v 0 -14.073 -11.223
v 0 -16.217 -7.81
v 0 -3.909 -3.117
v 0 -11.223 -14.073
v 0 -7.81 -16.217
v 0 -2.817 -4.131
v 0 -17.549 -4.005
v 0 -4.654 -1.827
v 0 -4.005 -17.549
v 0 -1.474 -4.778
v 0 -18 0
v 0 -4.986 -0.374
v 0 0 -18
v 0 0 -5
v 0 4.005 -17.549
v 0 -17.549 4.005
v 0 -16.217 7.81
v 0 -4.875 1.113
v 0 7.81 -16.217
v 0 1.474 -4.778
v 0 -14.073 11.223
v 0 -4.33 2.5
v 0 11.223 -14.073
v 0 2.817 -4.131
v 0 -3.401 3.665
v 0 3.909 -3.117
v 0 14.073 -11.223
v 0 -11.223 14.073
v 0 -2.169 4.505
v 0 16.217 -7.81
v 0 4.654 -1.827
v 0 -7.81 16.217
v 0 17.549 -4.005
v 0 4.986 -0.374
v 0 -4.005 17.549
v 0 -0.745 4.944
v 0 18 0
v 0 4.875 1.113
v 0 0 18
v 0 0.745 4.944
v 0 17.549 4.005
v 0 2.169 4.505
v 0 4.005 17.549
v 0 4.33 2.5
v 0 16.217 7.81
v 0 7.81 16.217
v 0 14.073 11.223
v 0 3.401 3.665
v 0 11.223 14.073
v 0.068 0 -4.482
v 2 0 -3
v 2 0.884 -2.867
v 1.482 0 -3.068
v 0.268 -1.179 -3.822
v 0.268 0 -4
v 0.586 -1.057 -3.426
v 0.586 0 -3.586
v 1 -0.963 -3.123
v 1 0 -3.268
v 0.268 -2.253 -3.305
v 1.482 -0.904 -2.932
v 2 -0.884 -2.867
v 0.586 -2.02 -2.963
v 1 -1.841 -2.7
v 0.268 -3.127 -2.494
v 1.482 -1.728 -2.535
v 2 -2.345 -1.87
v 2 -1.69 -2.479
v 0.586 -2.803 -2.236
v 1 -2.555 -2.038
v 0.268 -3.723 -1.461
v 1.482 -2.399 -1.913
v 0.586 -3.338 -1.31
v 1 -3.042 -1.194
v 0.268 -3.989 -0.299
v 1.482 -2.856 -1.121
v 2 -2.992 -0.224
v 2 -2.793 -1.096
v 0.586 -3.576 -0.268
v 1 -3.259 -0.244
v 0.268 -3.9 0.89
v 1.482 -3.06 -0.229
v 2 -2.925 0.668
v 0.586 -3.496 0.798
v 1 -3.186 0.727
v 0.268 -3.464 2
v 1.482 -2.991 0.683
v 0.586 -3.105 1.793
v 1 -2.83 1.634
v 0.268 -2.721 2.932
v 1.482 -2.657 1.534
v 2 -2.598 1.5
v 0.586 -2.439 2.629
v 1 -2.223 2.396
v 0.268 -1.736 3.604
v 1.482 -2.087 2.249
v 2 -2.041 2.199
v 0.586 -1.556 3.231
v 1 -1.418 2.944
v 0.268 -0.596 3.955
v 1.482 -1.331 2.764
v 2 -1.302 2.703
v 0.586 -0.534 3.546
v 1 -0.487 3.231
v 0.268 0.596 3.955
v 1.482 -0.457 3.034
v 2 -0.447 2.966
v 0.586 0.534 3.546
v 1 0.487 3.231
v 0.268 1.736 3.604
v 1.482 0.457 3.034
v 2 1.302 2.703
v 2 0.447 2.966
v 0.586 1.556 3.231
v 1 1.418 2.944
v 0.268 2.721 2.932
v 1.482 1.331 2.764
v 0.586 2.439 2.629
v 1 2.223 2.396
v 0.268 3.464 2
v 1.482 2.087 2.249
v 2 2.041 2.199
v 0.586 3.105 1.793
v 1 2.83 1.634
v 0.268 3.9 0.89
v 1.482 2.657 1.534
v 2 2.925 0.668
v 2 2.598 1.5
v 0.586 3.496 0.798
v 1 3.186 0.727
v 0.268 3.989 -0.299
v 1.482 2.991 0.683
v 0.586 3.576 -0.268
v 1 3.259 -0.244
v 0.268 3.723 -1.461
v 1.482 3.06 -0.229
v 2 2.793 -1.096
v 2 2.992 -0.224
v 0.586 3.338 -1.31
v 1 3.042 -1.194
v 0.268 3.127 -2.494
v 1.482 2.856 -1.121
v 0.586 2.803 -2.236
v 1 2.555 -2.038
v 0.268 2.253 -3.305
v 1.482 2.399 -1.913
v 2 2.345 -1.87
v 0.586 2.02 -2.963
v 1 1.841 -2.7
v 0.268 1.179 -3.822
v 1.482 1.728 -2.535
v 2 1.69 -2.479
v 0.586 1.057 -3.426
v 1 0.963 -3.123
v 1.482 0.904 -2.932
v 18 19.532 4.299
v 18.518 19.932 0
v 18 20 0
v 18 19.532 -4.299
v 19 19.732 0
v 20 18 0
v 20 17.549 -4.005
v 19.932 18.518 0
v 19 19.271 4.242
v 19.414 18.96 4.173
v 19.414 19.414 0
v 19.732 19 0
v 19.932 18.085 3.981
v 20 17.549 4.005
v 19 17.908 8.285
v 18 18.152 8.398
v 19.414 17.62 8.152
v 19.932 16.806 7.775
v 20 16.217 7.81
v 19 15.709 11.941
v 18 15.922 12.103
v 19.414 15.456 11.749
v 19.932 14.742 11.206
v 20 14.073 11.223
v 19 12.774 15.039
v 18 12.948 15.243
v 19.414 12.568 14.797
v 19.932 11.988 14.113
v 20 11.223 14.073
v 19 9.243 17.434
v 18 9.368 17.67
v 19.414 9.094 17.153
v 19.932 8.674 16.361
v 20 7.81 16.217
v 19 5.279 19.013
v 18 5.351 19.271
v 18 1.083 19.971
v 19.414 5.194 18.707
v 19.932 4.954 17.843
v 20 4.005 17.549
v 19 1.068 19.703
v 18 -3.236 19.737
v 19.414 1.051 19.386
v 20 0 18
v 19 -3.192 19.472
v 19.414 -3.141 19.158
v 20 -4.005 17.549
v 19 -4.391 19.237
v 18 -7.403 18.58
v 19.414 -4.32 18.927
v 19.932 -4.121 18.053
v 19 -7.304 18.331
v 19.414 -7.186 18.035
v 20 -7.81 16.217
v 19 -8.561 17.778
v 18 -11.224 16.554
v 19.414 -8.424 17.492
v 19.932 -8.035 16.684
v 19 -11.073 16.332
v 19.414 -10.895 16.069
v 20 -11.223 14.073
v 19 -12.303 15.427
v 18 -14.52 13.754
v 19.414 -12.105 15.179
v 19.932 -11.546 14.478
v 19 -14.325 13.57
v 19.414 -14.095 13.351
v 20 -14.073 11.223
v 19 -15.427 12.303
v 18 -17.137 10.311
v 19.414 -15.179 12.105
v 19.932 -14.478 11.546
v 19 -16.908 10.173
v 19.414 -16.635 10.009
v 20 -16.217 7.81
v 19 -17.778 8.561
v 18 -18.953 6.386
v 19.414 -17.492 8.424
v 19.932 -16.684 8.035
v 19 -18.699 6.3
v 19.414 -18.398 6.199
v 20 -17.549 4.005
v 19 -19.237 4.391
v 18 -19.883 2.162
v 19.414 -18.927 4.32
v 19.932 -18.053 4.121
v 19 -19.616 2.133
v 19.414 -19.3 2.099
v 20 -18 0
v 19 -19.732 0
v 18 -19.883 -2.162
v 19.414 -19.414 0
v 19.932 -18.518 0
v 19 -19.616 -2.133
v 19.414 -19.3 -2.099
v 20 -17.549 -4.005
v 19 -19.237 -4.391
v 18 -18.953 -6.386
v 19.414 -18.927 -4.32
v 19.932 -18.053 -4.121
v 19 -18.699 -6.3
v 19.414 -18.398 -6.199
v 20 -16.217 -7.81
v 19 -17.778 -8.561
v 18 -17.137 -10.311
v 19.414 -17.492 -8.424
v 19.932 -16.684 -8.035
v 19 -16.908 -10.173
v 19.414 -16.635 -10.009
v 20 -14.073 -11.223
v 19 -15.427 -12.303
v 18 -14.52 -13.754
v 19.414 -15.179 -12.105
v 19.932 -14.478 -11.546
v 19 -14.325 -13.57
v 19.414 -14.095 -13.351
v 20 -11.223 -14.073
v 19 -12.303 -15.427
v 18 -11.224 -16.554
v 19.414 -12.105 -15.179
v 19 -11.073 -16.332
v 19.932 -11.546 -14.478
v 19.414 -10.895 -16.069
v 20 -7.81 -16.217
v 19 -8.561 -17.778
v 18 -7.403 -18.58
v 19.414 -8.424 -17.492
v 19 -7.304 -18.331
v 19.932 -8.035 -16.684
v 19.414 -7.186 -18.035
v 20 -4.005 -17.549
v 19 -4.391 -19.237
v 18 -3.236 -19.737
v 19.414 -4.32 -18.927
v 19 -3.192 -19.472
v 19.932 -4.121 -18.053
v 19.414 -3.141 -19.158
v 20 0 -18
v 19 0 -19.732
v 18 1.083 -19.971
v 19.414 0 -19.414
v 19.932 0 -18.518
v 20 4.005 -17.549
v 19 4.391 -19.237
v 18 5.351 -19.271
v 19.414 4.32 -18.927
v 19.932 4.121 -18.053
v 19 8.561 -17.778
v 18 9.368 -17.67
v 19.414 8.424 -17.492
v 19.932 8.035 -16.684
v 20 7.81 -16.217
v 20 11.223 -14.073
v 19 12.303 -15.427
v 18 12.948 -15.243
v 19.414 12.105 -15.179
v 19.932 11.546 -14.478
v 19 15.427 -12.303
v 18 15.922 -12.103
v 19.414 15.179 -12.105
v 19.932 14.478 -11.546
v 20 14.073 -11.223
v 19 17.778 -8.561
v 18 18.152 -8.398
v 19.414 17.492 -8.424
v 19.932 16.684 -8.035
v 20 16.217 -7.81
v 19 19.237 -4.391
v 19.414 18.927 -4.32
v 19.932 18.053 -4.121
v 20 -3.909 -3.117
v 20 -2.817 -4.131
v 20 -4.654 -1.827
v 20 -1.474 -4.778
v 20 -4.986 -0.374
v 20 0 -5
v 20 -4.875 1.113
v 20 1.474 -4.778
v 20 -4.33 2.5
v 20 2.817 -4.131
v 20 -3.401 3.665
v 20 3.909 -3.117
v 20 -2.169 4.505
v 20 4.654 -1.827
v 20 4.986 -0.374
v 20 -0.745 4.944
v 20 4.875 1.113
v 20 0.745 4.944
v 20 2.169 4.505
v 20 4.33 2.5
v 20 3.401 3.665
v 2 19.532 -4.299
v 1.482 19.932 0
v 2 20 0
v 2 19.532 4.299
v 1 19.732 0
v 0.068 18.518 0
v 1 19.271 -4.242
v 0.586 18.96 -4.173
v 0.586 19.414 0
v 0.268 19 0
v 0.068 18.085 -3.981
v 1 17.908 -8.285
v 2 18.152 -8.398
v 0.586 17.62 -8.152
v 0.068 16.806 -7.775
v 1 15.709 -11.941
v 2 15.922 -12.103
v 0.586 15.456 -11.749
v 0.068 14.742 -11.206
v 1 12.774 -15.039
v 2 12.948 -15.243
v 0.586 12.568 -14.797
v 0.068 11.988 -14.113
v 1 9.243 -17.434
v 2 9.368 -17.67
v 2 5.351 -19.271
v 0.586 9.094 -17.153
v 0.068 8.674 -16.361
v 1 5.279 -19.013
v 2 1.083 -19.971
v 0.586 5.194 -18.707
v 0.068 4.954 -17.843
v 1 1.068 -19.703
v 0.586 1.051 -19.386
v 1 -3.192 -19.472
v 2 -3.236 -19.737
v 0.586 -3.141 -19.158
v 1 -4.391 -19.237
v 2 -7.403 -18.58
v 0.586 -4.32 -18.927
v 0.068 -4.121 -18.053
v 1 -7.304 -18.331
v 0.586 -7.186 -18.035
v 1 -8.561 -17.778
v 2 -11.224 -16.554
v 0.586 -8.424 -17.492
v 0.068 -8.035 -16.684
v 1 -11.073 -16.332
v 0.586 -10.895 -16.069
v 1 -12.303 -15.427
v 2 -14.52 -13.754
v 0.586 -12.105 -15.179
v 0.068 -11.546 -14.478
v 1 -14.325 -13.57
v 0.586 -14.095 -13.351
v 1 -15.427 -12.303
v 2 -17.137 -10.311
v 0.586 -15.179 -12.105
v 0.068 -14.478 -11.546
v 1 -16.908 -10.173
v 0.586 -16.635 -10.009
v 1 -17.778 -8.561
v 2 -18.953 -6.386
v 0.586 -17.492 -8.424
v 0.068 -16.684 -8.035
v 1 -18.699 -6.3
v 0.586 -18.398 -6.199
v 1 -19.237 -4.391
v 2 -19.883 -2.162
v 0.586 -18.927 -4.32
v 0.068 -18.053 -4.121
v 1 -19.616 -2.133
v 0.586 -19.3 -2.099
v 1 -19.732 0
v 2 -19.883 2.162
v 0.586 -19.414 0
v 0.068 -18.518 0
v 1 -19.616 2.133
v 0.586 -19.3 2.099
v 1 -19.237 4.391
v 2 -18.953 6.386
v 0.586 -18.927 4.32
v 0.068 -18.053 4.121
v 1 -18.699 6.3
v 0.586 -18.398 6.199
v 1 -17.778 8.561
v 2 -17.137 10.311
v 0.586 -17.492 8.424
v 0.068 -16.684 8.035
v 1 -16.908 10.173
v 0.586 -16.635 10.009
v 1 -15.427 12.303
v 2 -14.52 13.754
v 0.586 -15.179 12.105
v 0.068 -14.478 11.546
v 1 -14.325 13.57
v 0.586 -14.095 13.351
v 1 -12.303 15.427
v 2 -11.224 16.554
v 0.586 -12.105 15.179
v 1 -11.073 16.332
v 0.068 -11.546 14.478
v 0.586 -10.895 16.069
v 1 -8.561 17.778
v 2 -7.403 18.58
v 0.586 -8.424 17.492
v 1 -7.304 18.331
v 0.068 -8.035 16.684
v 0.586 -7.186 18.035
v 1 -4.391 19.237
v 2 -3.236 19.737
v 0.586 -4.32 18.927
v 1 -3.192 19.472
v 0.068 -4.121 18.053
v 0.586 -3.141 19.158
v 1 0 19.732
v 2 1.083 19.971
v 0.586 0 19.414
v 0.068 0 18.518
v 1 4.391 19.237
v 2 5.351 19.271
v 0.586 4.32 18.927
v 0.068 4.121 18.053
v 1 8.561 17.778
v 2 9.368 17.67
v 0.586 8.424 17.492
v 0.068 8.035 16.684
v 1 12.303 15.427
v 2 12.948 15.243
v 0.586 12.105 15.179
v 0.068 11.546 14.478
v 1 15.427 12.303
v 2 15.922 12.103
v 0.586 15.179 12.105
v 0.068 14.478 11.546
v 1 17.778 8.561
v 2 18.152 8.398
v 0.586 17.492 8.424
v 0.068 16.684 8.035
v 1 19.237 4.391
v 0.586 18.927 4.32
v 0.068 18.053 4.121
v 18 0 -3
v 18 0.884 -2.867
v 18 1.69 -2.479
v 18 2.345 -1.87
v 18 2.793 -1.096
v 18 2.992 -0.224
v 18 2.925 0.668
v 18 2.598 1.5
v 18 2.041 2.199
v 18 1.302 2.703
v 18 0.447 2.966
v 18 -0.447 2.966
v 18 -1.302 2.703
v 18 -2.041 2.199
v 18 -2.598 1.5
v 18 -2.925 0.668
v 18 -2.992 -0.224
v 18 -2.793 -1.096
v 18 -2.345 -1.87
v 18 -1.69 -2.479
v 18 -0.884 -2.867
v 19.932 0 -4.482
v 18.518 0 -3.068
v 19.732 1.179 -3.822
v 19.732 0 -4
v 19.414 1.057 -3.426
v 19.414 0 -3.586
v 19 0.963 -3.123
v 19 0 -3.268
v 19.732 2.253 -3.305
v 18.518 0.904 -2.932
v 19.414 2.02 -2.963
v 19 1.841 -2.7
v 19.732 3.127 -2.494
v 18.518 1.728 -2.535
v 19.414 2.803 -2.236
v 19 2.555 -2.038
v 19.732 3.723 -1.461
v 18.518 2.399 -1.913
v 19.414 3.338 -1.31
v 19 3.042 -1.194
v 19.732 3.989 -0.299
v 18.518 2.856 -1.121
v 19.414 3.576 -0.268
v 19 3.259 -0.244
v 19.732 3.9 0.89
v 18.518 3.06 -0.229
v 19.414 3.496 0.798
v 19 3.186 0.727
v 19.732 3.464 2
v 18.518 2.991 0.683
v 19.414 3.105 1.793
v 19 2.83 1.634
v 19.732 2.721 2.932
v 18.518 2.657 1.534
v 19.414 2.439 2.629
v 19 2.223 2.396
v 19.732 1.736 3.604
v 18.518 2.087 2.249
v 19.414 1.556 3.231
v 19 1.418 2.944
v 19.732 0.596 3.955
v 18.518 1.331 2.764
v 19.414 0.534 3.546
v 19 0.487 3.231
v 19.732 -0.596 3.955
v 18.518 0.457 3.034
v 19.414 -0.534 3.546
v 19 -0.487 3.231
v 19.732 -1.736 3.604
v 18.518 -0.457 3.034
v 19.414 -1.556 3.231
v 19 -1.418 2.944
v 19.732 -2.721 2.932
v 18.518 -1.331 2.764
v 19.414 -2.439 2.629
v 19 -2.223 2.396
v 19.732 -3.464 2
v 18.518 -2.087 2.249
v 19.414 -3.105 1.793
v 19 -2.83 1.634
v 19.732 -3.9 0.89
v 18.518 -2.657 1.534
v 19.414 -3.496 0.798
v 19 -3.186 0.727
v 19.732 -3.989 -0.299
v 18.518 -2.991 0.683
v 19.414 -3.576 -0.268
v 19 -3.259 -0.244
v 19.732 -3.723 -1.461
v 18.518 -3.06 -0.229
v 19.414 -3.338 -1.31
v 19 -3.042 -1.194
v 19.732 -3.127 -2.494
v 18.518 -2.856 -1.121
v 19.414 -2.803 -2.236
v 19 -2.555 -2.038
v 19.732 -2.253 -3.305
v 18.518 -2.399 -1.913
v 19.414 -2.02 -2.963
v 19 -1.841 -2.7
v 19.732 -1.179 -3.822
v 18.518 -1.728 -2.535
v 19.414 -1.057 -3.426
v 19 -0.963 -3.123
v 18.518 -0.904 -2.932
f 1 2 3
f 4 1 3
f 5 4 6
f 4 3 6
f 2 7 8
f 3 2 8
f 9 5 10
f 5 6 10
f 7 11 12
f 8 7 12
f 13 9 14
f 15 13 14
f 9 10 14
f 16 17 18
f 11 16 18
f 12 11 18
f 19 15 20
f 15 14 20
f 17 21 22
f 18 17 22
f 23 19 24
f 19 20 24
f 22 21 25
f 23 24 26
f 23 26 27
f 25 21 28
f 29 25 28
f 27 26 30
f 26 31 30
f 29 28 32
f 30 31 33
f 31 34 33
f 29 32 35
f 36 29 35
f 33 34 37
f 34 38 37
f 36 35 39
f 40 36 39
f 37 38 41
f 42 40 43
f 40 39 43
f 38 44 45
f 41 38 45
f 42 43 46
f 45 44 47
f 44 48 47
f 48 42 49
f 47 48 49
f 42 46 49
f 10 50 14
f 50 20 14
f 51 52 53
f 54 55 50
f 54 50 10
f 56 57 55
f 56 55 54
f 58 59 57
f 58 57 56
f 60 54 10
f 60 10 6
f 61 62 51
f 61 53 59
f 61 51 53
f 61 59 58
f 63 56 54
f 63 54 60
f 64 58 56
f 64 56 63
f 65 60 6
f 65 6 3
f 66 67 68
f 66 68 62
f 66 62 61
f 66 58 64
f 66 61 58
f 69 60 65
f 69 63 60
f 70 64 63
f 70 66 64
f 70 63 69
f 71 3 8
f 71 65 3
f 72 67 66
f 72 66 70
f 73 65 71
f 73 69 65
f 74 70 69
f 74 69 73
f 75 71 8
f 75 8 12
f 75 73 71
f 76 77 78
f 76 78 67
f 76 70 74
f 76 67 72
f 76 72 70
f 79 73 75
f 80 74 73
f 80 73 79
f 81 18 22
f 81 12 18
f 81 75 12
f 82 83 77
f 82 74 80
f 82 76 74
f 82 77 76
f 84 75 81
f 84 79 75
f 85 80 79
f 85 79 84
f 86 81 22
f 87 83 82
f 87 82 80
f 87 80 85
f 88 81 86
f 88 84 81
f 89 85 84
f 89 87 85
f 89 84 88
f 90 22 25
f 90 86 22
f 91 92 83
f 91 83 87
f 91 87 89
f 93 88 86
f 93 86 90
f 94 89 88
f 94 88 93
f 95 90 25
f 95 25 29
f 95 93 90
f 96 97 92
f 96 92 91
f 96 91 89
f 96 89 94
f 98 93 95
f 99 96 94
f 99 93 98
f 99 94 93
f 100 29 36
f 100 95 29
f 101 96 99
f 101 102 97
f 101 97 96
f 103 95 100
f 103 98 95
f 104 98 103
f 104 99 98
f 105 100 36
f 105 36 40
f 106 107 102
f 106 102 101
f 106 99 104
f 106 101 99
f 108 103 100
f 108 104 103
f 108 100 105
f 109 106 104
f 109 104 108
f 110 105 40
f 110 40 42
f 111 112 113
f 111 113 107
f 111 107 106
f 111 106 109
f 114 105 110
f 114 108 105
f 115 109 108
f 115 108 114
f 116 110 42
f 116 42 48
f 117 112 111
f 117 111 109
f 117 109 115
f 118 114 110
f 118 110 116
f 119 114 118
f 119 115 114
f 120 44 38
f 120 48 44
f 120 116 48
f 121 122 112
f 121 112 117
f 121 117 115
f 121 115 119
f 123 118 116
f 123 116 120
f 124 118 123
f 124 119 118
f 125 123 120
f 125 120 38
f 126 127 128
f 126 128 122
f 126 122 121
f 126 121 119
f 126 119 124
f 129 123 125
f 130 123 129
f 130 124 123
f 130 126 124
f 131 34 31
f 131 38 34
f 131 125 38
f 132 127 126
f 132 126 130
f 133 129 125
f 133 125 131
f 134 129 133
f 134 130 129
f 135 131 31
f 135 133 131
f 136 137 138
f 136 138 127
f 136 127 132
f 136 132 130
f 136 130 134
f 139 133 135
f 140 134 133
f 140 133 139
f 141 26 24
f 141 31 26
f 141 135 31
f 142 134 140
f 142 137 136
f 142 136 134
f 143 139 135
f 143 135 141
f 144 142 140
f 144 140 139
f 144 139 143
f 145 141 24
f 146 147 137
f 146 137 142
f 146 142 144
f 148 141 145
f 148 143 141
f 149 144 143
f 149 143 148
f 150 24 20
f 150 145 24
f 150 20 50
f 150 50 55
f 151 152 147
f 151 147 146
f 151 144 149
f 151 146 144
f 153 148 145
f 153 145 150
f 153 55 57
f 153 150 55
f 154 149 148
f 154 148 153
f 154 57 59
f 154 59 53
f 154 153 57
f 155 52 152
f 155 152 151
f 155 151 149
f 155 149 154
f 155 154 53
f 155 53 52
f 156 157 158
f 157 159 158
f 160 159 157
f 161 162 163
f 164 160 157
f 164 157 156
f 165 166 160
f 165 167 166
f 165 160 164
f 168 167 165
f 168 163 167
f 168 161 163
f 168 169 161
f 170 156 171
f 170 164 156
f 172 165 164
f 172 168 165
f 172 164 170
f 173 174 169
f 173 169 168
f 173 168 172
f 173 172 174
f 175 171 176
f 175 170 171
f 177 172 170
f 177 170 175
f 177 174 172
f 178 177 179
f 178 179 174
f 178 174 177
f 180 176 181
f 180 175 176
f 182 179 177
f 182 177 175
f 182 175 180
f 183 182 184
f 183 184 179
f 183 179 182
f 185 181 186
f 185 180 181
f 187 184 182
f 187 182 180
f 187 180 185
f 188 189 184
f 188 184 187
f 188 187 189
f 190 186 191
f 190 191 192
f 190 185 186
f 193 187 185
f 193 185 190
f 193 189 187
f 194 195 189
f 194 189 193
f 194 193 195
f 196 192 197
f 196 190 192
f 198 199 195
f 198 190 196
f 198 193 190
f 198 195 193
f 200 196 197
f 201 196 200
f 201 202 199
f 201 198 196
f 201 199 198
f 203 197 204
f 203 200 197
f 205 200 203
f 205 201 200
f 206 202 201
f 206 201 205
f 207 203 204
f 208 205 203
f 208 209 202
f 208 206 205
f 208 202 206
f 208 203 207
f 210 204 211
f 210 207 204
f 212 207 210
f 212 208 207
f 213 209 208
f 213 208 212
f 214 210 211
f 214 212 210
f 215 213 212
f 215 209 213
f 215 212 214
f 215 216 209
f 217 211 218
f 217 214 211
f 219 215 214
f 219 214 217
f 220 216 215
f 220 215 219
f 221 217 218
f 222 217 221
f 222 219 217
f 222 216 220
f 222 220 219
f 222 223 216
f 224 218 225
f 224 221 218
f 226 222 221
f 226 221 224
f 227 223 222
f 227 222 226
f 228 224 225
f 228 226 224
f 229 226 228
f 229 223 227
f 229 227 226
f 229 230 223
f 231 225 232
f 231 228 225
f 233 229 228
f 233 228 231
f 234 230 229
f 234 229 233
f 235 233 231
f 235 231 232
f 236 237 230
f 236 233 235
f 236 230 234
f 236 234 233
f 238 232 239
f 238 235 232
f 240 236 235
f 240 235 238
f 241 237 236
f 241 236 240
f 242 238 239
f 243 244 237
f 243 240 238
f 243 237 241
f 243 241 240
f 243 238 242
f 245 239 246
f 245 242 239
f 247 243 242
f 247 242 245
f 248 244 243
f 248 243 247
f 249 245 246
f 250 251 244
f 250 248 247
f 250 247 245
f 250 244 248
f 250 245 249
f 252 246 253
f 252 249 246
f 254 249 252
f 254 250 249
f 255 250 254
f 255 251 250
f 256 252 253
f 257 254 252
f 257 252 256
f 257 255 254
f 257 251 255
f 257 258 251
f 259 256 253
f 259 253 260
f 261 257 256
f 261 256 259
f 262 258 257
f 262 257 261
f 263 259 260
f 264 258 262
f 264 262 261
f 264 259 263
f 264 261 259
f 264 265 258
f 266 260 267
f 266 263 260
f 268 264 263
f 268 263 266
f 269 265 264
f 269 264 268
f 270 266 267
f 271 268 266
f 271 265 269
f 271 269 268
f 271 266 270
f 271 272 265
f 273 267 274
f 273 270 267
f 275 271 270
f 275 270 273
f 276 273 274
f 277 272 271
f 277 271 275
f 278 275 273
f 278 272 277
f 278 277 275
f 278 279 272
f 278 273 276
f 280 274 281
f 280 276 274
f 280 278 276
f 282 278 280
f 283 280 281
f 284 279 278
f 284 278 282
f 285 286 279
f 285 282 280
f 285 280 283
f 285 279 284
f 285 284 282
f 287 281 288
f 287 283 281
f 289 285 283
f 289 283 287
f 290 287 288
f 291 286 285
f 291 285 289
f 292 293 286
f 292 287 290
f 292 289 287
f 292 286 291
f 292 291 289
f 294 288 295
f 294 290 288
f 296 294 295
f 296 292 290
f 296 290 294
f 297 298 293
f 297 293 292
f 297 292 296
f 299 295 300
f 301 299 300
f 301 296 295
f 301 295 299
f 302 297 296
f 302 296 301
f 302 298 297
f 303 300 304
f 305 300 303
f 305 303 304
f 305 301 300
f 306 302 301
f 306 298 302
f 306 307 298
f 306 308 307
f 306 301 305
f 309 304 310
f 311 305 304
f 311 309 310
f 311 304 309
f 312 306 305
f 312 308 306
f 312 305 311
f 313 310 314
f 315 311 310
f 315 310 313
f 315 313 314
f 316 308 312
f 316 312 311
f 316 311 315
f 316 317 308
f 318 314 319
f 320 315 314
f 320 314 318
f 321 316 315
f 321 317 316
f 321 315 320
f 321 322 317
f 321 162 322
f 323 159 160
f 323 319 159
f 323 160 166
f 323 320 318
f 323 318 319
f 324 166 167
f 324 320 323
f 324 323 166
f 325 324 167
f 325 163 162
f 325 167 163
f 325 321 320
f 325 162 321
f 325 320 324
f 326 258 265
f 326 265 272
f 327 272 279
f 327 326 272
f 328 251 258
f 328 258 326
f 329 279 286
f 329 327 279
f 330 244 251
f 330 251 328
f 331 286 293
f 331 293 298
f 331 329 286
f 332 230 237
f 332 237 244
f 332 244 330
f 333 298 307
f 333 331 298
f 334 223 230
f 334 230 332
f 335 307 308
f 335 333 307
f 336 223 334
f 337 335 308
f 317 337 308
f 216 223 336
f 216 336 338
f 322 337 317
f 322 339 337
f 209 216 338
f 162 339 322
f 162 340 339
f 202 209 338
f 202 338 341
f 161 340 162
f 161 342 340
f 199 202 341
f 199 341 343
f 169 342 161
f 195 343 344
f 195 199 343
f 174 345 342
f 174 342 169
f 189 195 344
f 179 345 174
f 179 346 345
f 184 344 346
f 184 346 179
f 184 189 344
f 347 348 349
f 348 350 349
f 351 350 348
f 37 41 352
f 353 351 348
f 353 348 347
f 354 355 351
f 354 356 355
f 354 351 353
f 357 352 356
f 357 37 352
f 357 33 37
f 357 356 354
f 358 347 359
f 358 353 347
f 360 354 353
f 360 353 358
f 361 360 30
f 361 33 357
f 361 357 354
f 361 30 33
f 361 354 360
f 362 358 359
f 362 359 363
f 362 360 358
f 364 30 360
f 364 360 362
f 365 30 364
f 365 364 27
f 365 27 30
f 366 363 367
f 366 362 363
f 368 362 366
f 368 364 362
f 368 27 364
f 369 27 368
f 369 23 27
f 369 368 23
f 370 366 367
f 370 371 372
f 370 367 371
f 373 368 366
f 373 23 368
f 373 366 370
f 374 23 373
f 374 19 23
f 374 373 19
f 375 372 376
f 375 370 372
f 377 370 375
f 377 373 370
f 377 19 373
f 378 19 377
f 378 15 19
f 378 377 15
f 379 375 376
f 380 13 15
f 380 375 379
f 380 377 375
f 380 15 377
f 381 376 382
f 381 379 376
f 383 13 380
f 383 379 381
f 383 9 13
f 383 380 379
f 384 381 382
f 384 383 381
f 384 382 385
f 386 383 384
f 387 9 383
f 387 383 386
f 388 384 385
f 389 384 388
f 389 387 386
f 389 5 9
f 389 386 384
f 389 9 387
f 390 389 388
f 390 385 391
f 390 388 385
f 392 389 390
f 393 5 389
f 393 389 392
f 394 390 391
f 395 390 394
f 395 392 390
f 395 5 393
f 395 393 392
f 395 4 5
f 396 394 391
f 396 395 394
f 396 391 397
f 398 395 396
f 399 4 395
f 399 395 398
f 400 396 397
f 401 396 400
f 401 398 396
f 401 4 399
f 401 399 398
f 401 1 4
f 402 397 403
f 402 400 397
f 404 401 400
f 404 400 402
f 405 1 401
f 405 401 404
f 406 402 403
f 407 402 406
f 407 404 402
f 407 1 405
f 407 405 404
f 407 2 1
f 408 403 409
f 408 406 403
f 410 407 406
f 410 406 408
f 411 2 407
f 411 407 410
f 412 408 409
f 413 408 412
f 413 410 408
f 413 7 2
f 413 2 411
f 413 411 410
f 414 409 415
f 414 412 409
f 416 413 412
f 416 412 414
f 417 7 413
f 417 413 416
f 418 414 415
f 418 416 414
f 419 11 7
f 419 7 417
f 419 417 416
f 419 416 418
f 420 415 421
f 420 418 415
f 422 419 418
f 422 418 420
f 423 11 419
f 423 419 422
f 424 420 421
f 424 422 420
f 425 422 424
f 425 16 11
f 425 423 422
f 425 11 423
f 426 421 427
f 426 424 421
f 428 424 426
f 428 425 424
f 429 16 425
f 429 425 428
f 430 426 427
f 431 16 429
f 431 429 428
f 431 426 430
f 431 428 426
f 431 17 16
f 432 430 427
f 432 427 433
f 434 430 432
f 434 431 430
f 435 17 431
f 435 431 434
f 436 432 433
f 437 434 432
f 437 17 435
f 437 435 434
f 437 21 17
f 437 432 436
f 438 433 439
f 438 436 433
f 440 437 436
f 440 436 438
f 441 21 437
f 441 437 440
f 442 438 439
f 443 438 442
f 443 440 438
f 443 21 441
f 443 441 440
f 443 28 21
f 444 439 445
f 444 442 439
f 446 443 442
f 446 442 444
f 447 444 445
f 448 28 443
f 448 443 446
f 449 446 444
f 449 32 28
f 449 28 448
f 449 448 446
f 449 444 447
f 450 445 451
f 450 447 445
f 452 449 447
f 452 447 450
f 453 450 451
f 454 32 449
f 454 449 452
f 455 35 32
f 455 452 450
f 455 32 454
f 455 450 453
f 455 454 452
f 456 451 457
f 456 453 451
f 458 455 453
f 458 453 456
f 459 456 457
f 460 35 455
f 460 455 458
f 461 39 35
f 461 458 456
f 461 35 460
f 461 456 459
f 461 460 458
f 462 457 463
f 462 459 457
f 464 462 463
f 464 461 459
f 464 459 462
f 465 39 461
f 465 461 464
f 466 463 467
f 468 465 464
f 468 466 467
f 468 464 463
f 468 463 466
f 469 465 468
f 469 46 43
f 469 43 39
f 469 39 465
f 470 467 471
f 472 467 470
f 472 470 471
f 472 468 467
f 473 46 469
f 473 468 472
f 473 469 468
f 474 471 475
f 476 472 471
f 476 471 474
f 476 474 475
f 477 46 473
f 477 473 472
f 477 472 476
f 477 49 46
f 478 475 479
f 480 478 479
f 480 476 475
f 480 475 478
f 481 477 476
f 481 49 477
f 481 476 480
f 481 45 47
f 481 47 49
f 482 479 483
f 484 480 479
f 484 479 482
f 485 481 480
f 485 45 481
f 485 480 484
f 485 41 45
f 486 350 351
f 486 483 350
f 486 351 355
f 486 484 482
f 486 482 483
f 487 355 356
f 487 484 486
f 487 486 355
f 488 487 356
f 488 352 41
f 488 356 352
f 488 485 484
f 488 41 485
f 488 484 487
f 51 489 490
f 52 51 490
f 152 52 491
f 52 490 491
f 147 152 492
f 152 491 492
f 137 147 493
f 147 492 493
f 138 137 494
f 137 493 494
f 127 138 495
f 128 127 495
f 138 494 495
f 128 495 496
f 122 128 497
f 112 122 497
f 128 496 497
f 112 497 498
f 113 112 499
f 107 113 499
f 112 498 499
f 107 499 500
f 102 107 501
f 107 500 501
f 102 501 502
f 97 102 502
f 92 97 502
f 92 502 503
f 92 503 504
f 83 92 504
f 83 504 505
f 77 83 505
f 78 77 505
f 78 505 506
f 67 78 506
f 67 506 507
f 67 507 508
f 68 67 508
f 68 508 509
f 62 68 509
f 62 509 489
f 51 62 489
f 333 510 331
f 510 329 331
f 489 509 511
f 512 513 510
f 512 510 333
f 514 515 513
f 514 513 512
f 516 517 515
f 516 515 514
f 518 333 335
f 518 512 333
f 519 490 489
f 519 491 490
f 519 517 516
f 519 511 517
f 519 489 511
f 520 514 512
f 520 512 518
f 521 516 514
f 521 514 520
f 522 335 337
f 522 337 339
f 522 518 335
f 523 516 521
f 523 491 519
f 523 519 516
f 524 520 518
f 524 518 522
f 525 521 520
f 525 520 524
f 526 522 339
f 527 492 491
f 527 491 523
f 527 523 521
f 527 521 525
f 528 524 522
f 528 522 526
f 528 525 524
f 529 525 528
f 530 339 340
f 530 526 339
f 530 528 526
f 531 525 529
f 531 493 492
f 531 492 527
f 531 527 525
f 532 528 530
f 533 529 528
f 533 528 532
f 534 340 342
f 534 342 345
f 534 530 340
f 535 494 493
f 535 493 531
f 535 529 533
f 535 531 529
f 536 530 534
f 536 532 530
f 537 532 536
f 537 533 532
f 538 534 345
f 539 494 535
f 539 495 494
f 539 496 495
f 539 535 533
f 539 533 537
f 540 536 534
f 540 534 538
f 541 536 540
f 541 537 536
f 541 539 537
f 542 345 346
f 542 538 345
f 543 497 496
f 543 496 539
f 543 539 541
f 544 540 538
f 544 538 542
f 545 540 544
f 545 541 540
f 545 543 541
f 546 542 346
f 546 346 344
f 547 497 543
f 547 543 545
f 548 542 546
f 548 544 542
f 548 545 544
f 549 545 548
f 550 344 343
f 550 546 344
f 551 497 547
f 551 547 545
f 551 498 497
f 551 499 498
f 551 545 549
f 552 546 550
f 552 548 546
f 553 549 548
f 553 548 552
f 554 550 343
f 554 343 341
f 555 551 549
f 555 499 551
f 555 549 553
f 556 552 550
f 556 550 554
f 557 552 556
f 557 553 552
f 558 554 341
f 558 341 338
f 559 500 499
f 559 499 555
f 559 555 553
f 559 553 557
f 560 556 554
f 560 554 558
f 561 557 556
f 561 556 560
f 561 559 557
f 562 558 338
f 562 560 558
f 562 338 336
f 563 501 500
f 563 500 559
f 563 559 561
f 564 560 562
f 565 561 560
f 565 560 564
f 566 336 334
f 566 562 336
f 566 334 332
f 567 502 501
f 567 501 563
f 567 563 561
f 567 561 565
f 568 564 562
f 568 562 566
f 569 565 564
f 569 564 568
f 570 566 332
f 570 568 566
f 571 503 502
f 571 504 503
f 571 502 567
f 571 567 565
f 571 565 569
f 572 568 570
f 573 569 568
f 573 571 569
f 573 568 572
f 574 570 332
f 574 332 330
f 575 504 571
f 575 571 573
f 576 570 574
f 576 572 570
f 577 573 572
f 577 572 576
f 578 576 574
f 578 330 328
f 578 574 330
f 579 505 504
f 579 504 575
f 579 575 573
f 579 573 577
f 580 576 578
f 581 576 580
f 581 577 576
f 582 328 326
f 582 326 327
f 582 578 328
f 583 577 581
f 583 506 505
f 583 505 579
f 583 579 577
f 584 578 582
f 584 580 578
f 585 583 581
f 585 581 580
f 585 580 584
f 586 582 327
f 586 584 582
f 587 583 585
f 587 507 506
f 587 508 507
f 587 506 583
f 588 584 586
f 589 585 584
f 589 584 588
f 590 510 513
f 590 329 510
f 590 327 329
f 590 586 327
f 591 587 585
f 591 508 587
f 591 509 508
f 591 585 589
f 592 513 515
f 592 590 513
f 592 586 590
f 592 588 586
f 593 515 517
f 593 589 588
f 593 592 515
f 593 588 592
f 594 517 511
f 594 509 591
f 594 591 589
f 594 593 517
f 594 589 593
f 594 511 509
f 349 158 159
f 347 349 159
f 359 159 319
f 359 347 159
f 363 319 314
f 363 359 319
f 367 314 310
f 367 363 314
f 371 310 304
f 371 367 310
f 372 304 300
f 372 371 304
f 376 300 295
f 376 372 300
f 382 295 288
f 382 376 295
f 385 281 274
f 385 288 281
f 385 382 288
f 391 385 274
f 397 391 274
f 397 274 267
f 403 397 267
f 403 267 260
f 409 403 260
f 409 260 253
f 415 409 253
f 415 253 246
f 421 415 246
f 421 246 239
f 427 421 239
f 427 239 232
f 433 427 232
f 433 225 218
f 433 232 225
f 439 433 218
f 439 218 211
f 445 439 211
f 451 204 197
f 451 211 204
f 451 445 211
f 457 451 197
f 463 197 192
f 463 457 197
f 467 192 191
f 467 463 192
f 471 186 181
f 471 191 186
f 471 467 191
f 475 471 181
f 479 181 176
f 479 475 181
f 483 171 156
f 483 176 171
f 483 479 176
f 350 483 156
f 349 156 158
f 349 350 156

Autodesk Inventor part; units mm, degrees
ref_plane "YZ Plane" through (0, 0, 0) normal (1, 0, 0) x (0, 1, 0)
ref_plane "XZ Plane" through (0, 0, 0) normal (0, 1, 0) x (-1, 0, 0)
ref_plane "XY Plane" through (0, 0, 0) normal (0, 0, 1) x (1, 0, 0)
sketch "草图1" plane through (0, 0, 0) normal (1, 0, 0) x (0, 1, 0)
  circle A0 centre (0, 0) radius 20
  dimension "d0" = 40
extrude "拉伸1" add sketch "草图1" along normal blind 20
sketch "草图2" plane through (20, 0, 0) normal (1, 0, 0) x (0, 0, -1)
  circle A0 centre (0, 0) radius 3
  dimension "d3" = 6
extrude "拉伸2" cut sketch "草图2" against normal through all
fillet "圆角1" radius 2 4 edges at (0, -20, 0) (20, -20, 0) (0, 0, 3) (20, 0, 3)
properties part number "皮带轮"
